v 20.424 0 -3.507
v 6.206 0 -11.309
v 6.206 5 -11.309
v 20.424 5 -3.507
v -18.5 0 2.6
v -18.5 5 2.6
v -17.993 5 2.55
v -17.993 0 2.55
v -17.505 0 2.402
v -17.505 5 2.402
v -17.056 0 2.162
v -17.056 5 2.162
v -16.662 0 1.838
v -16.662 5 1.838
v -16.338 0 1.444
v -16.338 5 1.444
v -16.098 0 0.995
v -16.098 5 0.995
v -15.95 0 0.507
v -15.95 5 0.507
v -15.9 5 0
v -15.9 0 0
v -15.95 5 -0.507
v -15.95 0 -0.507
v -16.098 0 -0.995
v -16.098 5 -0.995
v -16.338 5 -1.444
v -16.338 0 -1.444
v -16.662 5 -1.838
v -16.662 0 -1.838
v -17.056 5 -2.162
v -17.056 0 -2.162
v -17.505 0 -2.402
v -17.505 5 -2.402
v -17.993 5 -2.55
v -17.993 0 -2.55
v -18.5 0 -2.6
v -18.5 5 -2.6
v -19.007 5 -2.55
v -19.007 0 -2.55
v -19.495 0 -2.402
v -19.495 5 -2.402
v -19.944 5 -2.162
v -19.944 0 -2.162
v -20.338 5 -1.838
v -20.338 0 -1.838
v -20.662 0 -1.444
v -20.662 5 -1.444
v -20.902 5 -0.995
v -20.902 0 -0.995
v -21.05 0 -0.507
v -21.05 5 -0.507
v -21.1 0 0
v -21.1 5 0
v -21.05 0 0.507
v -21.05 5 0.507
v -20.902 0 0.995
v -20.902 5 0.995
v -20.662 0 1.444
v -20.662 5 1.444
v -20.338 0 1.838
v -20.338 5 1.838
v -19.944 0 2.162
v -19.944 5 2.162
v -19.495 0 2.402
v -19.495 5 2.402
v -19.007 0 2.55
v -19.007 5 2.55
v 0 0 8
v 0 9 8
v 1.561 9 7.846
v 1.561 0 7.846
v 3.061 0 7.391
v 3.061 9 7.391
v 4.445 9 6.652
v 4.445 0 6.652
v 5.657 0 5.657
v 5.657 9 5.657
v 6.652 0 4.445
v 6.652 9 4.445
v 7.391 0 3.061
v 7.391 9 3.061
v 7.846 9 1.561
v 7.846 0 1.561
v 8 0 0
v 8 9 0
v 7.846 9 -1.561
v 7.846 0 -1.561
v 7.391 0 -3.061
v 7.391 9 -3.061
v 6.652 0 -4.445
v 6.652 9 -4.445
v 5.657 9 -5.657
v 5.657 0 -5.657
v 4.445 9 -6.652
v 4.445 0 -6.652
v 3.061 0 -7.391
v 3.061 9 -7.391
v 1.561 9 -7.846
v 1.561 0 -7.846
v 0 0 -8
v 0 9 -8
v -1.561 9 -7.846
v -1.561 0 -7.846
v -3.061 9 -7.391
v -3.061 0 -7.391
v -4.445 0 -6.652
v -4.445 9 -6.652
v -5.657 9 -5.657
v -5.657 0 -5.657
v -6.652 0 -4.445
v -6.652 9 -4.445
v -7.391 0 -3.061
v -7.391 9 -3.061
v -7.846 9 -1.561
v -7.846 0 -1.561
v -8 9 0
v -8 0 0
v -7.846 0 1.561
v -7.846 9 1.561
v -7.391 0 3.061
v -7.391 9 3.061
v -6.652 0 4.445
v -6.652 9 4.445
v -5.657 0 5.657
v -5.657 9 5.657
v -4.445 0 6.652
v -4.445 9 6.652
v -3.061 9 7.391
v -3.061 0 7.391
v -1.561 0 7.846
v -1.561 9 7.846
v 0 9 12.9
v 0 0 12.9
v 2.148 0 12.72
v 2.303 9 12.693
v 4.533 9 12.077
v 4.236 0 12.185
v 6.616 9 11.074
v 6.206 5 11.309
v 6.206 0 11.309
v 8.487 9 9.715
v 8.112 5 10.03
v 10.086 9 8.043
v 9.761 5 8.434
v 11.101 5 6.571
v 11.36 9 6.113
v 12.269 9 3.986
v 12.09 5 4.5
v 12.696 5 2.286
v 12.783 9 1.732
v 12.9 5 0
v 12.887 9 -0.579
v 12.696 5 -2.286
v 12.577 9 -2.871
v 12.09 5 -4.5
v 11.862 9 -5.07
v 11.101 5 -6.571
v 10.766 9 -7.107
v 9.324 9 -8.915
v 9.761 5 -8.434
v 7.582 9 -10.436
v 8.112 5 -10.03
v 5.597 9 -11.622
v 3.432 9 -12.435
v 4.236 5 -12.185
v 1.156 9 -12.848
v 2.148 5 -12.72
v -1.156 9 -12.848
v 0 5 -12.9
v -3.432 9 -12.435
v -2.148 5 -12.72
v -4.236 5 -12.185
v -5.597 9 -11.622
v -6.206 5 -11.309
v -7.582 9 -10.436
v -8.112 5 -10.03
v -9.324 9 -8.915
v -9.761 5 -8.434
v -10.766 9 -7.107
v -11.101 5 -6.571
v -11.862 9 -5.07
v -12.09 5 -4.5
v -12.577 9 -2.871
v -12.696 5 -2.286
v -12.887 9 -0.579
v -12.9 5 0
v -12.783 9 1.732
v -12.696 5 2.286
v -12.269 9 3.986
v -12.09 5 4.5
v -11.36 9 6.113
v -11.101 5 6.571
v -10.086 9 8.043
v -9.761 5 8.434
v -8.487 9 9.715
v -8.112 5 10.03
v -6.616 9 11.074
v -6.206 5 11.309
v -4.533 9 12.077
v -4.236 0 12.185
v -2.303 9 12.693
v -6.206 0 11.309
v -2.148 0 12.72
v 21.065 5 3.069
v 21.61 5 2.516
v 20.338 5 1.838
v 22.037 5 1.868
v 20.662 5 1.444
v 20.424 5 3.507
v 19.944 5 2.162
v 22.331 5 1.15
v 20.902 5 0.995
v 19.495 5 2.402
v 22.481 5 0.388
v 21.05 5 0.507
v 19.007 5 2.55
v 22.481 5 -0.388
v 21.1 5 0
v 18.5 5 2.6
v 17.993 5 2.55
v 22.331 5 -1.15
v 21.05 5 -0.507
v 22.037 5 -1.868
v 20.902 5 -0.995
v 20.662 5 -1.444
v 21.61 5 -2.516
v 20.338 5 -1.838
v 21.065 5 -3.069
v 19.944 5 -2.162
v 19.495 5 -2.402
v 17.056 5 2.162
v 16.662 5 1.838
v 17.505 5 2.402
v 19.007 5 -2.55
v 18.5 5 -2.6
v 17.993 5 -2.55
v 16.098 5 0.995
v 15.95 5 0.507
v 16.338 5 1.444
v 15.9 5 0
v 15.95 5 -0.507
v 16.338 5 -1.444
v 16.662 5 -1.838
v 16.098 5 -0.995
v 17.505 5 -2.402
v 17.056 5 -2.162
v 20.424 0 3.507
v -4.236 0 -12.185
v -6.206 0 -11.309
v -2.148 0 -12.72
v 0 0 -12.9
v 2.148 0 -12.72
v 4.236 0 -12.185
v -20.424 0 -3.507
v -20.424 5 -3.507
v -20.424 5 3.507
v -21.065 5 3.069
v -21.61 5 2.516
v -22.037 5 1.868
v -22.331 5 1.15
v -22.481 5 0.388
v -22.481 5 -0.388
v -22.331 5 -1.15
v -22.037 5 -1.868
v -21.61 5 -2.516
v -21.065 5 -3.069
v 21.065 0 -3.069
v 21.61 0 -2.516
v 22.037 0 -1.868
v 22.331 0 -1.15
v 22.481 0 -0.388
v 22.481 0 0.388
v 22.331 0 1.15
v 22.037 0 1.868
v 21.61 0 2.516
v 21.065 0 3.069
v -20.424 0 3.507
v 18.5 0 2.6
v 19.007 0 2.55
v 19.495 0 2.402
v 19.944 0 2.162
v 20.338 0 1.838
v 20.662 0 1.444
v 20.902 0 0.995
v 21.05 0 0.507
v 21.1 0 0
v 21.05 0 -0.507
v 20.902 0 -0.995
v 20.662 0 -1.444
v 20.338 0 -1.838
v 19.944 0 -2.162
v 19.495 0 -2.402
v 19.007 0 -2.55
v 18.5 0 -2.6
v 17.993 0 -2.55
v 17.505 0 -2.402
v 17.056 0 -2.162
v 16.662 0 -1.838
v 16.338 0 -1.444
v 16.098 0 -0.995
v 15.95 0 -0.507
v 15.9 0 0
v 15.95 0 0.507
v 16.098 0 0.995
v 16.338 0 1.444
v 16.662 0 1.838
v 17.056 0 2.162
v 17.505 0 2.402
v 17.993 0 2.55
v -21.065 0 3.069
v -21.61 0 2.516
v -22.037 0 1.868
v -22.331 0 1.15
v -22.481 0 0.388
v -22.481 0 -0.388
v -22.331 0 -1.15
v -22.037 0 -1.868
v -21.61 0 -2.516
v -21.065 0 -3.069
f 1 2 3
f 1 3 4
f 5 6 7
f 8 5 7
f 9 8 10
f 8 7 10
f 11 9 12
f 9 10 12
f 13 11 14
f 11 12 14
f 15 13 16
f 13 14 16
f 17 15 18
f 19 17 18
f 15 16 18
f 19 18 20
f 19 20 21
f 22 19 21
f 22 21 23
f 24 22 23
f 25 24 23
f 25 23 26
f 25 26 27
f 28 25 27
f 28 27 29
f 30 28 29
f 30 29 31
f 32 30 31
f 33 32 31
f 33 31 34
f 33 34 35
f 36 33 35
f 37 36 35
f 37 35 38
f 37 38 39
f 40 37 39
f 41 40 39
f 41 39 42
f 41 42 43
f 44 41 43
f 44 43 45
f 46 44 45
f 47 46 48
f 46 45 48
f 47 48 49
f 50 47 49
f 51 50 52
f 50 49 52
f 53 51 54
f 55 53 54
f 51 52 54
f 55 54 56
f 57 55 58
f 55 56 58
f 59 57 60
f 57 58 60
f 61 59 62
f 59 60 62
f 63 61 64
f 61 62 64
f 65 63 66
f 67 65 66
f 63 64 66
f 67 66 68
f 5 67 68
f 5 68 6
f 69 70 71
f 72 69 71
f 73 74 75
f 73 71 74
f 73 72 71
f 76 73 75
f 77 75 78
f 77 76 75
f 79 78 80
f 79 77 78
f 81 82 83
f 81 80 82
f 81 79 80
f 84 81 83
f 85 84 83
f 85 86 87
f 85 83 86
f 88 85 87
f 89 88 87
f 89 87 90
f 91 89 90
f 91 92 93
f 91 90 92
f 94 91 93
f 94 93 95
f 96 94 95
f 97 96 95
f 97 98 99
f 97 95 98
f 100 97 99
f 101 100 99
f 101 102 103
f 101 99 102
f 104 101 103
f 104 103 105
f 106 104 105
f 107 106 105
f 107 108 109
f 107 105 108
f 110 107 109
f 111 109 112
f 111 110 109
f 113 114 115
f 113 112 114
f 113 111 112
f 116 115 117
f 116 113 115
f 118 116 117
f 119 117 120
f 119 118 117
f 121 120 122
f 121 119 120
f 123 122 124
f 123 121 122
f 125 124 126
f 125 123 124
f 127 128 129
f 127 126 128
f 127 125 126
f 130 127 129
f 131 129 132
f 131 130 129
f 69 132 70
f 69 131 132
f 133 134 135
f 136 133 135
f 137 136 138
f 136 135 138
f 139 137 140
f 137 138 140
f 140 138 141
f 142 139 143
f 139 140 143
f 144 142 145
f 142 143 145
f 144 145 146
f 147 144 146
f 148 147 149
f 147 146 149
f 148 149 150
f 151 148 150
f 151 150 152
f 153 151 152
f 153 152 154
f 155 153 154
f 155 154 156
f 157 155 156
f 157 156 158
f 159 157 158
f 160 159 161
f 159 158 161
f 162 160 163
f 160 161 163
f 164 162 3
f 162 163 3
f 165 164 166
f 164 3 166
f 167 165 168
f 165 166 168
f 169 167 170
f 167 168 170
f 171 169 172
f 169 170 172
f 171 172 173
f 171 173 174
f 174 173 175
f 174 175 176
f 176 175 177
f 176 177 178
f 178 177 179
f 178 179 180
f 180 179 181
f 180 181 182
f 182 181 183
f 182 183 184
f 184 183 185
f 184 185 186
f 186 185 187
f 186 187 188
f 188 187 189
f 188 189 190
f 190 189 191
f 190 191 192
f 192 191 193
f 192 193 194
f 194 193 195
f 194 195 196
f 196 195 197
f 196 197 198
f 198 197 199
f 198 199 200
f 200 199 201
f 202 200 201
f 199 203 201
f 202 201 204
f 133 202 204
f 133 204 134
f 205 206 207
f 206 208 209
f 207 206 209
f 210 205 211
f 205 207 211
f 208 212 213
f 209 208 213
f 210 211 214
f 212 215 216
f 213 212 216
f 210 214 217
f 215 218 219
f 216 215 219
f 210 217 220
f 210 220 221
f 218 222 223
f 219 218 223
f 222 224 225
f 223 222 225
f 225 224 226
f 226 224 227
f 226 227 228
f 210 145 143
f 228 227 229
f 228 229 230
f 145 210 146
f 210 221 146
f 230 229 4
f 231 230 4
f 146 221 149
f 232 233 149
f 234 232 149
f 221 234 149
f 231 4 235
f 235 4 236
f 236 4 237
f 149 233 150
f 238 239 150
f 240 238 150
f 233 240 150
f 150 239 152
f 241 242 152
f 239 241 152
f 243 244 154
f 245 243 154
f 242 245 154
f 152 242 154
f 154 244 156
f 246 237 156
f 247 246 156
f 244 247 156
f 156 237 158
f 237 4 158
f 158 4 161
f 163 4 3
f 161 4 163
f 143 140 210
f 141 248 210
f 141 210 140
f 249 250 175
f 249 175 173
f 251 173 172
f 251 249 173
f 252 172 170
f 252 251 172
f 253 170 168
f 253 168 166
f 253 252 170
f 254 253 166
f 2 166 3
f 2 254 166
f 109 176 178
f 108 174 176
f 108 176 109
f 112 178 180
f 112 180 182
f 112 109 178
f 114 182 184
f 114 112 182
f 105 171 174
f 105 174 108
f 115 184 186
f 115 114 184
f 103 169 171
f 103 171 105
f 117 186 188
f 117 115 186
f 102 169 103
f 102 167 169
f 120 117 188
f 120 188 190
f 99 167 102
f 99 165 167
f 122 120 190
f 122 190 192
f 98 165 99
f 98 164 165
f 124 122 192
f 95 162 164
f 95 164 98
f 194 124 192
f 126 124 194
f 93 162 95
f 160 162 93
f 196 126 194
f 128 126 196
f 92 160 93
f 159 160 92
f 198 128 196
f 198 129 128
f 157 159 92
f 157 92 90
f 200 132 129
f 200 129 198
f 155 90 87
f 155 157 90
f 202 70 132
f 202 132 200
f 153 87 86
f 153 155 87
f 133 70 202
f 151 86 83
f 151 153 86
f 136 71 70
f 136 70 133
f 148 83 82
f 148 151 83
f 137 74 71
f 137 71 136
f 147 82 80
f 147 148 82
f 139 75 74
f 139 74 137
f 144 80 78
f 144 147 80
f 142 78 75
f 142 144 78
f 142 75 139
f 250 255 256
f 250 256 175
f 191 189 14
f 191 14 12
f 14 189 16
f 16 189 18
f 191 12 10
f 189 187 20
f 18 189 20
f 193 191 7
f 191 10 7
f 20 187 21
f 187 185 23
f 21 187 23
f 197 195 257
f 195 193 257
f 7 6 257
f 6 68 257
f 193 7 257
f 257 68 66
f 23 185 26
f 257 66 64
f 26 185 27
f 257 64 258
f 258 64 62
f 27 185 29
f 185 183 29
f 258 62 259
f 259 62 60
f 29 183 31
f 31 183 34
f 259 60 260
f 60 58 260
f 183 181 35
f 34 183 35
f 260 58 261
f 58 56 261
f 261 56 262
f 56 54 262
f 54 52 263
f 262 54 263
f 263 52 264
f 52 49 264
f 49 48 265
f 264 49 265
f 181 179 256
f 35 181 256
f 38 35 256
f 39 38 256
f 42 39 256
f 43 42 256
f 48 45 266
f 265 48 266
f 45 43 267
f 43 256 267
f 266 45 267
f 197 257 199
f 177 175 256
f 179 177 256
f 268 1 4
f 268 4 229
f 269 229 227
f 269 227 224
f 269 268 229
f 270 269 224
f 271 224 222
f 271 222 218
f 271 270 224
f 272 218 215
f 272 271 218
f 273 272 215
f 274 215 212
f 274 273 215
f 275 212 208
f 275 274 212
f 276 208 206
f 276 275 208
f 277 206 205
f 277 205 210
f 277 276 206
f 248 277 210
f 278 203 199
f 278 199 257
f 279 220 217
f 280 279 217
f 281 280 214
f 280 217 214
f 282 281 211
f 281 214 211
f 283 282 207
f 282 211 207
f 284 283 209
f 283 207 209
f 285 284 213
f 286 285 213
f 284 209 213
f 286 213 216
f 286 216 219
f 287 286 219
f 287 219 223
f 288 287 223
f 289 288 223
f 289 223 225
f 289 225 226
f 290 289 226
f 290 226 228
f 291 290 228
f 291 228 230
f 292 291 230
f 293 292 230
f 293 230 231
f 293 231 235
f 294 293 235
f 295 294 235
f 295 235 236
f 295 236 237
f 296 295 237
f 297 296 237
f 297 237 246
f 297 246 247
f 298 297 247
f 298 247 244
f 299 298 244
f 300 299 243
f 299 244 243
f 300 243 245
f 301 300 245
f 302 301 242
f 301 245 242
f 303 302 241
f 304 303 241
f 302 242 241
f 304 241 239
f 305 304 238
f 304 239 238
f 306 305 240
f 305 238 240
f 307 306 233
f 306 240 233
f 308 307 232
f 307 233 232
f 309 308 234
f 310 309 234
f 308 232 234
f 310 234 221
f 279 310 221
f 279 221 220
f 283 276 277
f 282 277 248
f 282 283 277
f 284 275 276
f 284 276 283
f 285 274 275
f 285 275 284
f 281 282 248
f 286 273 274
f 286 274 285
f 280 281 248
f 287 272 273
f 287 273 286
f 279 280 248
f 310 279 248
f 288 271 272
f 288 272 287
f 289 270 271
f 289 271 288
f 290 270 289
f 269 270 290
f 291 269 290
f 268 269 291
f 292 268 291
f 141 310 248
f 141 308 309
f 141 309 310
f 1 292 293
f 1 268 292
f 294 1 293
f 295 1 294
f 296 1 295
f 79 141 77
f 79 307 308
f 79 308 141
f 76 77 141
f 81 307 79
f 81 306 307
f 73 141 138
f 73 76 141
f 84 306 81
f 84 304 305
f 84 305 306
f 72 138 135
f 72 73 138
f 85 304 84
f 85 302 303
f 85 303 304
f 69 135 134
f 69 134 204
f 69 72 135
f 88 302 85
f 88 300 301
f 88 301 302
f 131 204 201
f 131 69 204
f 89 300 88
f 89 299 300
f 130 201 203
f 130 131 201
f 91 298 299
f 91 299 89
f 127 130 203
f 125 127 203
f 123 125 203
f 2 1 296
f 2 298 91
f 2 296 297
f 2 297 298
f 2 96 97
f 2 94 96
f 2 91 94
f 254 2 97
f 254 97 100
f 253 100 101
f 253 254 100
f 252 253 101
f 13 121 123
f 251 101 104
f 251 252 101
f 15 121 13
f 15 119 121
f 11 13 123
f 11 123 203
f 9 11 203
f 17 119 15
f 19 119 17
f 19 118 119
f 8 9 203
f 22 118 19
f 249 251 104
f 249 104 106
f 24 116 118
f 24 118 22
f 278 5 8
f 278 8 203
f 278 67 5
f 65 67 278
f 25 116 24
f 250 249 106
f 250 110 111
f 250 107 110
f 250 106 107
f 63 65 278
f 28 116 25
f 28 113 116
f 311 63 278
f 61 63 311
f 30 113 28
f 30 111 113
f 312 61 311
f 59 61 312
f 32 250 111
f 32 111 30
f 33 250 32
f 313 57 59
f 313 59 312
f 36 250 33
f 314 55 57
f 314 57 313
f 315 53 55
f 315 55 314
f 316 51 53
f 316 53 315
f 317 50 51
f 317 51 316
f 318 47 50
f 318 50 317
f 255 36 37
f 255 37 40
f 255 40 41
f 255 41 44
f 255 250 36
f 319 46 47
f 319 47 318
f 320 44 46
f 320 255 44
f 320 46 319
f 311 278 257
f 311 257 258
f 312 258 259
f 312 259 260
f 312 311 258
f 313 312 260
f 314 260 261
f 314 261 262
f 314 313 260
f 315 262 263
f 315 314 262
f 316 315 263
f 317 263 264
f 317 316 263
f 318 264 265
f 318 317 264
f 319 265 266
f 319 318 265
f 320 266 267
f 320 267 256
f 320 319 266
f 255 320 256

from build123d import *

# Parameters (mm, degrees)
SKETCH_3_R               = 12.9
EXTRUDE_1_DEPTH          = 9
EXTRUDE_2_DEPTH          = 5
SKETCH_5_R               = 6.1
EXTRUDE_3_DEPTH          = 2.5
SKETCH_6_R               = 4
CUT_EXTRUDE_1_DEPTH      = 29.370936
SKETCH_7_R               = 2.6
CUT_EXTRUDE_2_DEPTH      = 27.737801
CUT_EXTRUDE_3_DEPTH      = 17
CUT_EXTRUDE_3_DEPTH_BACK = 15
SKETCH_8_R               = 8


with BuildPart() as part:
    # 草图3 → 凸台-拉伸1 (new body)
    with BuildSketch(Plane(origin=(0, 0, 0), x_dir=(1, 0, 0), z_dir=(0, 1, 0))):
        with Locations(Location((0, 0, 0), (0, 0, 270))):
            Circle(SKETCH_3_R)
    extrude(amount=EXTRUDE_1_DEPTH)

    # 草图4 → 凸台-拉伸2 (add)
    with BuildSketch(Plane(origin=(0, 0, 0), x_dir=(1, 0, 0), z_dir=(0, 1, 0))):
        with BuildLine():
            Line((-20.424324, 3.506704), (-6.205946, 11.309122))
            ThreePointArc((-6.205946, 11.309122), (0, 12.9), (6.205946, 11.309122))
            Line((6.205946, 11.309122), (20.424324, 3.506704))
            ThreePointArc((20.424324, 3.506704), (22.5, 0), (20.424324, -3.506704))
            Line((20.424324, -3.506704), (6.205946, -11.309122))
            ThreePointArc((6.205946, -11.309122), (0, -12.9), (-6.205946, -11.309122))
            Line((-6.205946, -11.309122), (-20.424324, -3.506704))
            ThreePointArc((-20.424324, -3.506704), (-22.5, 0), (-20.424324, 3.506704))
        make_face()
    extrude(amount=EXTRUDE_2_DEPTH)

    # 草图5 → 凸台-拉伸3 (add)
    with BuildSketch(Plane(origin=(0, 9, 0), x_dir=(1, 0, 0), z_dir=(0, 1, 0))):
        with Locations(Location((0, 0, 0), (0, 0, 270))):
            Circle(SKETCH_5_R)
    extrude(amount=EXTRUDE_3_DEPTH)

    # 草图6 → 切除-拉伸1 (cut, through all)
    with BuildSketch(Plane(origin=(0, 11.5, 0), x_dir=(1, 0, 0), z_dir=(0, 1, 0))):
        with Locations(Location((0, 0, 0), (0, 0, 270))):
            Circle(SKETCH_6_R)
    extrude(amount=-CUT_EXTRUDE_1_DEPTH, mode=Mode.SUBTRACT)

    # 草图7 → 切除-拉伸2 (cut, through all)
    with BuildSketch(Plane(origin=(0, 5, 0), x_dir=(1, 0, 0), z_dir=(0, 1, 0))):
        with Locations(Location((18.5, 0, 0), (0, 0, 270))):
            Circle(SKETCH_7_R)
        with Locations(Location((-18.5, 0, 0), (0, 0, 270))):
            Circle(SKETCH_7_R)
    extrude(amount=-CUT_EXTRUDE_2_DEPTH, mode=Mode.SUBTRACT)

    # 草图8 → 切除-拉伸3 (cut, two sides: drawn at the far end of the back side and taken through both)
    with BuildSketch(Plane(origin=(0, 9, 0), x_dir=(1, 0, 0), z_dir=(0, 1, 0)).offset(-CUT_EXTRUDE_3_DEPTH_BACK)):
        with Locations(Location((0, 0, 0), (0, 0, 270))):
            Circle(SKETCH_8_R)
    extrude(amount=CUT_EXTRUDE_3_DEPTH + CUT_EXTRUDE_3_DEPTH_BACK, mode=Mode.SUBTRACT)


solid = part.part
